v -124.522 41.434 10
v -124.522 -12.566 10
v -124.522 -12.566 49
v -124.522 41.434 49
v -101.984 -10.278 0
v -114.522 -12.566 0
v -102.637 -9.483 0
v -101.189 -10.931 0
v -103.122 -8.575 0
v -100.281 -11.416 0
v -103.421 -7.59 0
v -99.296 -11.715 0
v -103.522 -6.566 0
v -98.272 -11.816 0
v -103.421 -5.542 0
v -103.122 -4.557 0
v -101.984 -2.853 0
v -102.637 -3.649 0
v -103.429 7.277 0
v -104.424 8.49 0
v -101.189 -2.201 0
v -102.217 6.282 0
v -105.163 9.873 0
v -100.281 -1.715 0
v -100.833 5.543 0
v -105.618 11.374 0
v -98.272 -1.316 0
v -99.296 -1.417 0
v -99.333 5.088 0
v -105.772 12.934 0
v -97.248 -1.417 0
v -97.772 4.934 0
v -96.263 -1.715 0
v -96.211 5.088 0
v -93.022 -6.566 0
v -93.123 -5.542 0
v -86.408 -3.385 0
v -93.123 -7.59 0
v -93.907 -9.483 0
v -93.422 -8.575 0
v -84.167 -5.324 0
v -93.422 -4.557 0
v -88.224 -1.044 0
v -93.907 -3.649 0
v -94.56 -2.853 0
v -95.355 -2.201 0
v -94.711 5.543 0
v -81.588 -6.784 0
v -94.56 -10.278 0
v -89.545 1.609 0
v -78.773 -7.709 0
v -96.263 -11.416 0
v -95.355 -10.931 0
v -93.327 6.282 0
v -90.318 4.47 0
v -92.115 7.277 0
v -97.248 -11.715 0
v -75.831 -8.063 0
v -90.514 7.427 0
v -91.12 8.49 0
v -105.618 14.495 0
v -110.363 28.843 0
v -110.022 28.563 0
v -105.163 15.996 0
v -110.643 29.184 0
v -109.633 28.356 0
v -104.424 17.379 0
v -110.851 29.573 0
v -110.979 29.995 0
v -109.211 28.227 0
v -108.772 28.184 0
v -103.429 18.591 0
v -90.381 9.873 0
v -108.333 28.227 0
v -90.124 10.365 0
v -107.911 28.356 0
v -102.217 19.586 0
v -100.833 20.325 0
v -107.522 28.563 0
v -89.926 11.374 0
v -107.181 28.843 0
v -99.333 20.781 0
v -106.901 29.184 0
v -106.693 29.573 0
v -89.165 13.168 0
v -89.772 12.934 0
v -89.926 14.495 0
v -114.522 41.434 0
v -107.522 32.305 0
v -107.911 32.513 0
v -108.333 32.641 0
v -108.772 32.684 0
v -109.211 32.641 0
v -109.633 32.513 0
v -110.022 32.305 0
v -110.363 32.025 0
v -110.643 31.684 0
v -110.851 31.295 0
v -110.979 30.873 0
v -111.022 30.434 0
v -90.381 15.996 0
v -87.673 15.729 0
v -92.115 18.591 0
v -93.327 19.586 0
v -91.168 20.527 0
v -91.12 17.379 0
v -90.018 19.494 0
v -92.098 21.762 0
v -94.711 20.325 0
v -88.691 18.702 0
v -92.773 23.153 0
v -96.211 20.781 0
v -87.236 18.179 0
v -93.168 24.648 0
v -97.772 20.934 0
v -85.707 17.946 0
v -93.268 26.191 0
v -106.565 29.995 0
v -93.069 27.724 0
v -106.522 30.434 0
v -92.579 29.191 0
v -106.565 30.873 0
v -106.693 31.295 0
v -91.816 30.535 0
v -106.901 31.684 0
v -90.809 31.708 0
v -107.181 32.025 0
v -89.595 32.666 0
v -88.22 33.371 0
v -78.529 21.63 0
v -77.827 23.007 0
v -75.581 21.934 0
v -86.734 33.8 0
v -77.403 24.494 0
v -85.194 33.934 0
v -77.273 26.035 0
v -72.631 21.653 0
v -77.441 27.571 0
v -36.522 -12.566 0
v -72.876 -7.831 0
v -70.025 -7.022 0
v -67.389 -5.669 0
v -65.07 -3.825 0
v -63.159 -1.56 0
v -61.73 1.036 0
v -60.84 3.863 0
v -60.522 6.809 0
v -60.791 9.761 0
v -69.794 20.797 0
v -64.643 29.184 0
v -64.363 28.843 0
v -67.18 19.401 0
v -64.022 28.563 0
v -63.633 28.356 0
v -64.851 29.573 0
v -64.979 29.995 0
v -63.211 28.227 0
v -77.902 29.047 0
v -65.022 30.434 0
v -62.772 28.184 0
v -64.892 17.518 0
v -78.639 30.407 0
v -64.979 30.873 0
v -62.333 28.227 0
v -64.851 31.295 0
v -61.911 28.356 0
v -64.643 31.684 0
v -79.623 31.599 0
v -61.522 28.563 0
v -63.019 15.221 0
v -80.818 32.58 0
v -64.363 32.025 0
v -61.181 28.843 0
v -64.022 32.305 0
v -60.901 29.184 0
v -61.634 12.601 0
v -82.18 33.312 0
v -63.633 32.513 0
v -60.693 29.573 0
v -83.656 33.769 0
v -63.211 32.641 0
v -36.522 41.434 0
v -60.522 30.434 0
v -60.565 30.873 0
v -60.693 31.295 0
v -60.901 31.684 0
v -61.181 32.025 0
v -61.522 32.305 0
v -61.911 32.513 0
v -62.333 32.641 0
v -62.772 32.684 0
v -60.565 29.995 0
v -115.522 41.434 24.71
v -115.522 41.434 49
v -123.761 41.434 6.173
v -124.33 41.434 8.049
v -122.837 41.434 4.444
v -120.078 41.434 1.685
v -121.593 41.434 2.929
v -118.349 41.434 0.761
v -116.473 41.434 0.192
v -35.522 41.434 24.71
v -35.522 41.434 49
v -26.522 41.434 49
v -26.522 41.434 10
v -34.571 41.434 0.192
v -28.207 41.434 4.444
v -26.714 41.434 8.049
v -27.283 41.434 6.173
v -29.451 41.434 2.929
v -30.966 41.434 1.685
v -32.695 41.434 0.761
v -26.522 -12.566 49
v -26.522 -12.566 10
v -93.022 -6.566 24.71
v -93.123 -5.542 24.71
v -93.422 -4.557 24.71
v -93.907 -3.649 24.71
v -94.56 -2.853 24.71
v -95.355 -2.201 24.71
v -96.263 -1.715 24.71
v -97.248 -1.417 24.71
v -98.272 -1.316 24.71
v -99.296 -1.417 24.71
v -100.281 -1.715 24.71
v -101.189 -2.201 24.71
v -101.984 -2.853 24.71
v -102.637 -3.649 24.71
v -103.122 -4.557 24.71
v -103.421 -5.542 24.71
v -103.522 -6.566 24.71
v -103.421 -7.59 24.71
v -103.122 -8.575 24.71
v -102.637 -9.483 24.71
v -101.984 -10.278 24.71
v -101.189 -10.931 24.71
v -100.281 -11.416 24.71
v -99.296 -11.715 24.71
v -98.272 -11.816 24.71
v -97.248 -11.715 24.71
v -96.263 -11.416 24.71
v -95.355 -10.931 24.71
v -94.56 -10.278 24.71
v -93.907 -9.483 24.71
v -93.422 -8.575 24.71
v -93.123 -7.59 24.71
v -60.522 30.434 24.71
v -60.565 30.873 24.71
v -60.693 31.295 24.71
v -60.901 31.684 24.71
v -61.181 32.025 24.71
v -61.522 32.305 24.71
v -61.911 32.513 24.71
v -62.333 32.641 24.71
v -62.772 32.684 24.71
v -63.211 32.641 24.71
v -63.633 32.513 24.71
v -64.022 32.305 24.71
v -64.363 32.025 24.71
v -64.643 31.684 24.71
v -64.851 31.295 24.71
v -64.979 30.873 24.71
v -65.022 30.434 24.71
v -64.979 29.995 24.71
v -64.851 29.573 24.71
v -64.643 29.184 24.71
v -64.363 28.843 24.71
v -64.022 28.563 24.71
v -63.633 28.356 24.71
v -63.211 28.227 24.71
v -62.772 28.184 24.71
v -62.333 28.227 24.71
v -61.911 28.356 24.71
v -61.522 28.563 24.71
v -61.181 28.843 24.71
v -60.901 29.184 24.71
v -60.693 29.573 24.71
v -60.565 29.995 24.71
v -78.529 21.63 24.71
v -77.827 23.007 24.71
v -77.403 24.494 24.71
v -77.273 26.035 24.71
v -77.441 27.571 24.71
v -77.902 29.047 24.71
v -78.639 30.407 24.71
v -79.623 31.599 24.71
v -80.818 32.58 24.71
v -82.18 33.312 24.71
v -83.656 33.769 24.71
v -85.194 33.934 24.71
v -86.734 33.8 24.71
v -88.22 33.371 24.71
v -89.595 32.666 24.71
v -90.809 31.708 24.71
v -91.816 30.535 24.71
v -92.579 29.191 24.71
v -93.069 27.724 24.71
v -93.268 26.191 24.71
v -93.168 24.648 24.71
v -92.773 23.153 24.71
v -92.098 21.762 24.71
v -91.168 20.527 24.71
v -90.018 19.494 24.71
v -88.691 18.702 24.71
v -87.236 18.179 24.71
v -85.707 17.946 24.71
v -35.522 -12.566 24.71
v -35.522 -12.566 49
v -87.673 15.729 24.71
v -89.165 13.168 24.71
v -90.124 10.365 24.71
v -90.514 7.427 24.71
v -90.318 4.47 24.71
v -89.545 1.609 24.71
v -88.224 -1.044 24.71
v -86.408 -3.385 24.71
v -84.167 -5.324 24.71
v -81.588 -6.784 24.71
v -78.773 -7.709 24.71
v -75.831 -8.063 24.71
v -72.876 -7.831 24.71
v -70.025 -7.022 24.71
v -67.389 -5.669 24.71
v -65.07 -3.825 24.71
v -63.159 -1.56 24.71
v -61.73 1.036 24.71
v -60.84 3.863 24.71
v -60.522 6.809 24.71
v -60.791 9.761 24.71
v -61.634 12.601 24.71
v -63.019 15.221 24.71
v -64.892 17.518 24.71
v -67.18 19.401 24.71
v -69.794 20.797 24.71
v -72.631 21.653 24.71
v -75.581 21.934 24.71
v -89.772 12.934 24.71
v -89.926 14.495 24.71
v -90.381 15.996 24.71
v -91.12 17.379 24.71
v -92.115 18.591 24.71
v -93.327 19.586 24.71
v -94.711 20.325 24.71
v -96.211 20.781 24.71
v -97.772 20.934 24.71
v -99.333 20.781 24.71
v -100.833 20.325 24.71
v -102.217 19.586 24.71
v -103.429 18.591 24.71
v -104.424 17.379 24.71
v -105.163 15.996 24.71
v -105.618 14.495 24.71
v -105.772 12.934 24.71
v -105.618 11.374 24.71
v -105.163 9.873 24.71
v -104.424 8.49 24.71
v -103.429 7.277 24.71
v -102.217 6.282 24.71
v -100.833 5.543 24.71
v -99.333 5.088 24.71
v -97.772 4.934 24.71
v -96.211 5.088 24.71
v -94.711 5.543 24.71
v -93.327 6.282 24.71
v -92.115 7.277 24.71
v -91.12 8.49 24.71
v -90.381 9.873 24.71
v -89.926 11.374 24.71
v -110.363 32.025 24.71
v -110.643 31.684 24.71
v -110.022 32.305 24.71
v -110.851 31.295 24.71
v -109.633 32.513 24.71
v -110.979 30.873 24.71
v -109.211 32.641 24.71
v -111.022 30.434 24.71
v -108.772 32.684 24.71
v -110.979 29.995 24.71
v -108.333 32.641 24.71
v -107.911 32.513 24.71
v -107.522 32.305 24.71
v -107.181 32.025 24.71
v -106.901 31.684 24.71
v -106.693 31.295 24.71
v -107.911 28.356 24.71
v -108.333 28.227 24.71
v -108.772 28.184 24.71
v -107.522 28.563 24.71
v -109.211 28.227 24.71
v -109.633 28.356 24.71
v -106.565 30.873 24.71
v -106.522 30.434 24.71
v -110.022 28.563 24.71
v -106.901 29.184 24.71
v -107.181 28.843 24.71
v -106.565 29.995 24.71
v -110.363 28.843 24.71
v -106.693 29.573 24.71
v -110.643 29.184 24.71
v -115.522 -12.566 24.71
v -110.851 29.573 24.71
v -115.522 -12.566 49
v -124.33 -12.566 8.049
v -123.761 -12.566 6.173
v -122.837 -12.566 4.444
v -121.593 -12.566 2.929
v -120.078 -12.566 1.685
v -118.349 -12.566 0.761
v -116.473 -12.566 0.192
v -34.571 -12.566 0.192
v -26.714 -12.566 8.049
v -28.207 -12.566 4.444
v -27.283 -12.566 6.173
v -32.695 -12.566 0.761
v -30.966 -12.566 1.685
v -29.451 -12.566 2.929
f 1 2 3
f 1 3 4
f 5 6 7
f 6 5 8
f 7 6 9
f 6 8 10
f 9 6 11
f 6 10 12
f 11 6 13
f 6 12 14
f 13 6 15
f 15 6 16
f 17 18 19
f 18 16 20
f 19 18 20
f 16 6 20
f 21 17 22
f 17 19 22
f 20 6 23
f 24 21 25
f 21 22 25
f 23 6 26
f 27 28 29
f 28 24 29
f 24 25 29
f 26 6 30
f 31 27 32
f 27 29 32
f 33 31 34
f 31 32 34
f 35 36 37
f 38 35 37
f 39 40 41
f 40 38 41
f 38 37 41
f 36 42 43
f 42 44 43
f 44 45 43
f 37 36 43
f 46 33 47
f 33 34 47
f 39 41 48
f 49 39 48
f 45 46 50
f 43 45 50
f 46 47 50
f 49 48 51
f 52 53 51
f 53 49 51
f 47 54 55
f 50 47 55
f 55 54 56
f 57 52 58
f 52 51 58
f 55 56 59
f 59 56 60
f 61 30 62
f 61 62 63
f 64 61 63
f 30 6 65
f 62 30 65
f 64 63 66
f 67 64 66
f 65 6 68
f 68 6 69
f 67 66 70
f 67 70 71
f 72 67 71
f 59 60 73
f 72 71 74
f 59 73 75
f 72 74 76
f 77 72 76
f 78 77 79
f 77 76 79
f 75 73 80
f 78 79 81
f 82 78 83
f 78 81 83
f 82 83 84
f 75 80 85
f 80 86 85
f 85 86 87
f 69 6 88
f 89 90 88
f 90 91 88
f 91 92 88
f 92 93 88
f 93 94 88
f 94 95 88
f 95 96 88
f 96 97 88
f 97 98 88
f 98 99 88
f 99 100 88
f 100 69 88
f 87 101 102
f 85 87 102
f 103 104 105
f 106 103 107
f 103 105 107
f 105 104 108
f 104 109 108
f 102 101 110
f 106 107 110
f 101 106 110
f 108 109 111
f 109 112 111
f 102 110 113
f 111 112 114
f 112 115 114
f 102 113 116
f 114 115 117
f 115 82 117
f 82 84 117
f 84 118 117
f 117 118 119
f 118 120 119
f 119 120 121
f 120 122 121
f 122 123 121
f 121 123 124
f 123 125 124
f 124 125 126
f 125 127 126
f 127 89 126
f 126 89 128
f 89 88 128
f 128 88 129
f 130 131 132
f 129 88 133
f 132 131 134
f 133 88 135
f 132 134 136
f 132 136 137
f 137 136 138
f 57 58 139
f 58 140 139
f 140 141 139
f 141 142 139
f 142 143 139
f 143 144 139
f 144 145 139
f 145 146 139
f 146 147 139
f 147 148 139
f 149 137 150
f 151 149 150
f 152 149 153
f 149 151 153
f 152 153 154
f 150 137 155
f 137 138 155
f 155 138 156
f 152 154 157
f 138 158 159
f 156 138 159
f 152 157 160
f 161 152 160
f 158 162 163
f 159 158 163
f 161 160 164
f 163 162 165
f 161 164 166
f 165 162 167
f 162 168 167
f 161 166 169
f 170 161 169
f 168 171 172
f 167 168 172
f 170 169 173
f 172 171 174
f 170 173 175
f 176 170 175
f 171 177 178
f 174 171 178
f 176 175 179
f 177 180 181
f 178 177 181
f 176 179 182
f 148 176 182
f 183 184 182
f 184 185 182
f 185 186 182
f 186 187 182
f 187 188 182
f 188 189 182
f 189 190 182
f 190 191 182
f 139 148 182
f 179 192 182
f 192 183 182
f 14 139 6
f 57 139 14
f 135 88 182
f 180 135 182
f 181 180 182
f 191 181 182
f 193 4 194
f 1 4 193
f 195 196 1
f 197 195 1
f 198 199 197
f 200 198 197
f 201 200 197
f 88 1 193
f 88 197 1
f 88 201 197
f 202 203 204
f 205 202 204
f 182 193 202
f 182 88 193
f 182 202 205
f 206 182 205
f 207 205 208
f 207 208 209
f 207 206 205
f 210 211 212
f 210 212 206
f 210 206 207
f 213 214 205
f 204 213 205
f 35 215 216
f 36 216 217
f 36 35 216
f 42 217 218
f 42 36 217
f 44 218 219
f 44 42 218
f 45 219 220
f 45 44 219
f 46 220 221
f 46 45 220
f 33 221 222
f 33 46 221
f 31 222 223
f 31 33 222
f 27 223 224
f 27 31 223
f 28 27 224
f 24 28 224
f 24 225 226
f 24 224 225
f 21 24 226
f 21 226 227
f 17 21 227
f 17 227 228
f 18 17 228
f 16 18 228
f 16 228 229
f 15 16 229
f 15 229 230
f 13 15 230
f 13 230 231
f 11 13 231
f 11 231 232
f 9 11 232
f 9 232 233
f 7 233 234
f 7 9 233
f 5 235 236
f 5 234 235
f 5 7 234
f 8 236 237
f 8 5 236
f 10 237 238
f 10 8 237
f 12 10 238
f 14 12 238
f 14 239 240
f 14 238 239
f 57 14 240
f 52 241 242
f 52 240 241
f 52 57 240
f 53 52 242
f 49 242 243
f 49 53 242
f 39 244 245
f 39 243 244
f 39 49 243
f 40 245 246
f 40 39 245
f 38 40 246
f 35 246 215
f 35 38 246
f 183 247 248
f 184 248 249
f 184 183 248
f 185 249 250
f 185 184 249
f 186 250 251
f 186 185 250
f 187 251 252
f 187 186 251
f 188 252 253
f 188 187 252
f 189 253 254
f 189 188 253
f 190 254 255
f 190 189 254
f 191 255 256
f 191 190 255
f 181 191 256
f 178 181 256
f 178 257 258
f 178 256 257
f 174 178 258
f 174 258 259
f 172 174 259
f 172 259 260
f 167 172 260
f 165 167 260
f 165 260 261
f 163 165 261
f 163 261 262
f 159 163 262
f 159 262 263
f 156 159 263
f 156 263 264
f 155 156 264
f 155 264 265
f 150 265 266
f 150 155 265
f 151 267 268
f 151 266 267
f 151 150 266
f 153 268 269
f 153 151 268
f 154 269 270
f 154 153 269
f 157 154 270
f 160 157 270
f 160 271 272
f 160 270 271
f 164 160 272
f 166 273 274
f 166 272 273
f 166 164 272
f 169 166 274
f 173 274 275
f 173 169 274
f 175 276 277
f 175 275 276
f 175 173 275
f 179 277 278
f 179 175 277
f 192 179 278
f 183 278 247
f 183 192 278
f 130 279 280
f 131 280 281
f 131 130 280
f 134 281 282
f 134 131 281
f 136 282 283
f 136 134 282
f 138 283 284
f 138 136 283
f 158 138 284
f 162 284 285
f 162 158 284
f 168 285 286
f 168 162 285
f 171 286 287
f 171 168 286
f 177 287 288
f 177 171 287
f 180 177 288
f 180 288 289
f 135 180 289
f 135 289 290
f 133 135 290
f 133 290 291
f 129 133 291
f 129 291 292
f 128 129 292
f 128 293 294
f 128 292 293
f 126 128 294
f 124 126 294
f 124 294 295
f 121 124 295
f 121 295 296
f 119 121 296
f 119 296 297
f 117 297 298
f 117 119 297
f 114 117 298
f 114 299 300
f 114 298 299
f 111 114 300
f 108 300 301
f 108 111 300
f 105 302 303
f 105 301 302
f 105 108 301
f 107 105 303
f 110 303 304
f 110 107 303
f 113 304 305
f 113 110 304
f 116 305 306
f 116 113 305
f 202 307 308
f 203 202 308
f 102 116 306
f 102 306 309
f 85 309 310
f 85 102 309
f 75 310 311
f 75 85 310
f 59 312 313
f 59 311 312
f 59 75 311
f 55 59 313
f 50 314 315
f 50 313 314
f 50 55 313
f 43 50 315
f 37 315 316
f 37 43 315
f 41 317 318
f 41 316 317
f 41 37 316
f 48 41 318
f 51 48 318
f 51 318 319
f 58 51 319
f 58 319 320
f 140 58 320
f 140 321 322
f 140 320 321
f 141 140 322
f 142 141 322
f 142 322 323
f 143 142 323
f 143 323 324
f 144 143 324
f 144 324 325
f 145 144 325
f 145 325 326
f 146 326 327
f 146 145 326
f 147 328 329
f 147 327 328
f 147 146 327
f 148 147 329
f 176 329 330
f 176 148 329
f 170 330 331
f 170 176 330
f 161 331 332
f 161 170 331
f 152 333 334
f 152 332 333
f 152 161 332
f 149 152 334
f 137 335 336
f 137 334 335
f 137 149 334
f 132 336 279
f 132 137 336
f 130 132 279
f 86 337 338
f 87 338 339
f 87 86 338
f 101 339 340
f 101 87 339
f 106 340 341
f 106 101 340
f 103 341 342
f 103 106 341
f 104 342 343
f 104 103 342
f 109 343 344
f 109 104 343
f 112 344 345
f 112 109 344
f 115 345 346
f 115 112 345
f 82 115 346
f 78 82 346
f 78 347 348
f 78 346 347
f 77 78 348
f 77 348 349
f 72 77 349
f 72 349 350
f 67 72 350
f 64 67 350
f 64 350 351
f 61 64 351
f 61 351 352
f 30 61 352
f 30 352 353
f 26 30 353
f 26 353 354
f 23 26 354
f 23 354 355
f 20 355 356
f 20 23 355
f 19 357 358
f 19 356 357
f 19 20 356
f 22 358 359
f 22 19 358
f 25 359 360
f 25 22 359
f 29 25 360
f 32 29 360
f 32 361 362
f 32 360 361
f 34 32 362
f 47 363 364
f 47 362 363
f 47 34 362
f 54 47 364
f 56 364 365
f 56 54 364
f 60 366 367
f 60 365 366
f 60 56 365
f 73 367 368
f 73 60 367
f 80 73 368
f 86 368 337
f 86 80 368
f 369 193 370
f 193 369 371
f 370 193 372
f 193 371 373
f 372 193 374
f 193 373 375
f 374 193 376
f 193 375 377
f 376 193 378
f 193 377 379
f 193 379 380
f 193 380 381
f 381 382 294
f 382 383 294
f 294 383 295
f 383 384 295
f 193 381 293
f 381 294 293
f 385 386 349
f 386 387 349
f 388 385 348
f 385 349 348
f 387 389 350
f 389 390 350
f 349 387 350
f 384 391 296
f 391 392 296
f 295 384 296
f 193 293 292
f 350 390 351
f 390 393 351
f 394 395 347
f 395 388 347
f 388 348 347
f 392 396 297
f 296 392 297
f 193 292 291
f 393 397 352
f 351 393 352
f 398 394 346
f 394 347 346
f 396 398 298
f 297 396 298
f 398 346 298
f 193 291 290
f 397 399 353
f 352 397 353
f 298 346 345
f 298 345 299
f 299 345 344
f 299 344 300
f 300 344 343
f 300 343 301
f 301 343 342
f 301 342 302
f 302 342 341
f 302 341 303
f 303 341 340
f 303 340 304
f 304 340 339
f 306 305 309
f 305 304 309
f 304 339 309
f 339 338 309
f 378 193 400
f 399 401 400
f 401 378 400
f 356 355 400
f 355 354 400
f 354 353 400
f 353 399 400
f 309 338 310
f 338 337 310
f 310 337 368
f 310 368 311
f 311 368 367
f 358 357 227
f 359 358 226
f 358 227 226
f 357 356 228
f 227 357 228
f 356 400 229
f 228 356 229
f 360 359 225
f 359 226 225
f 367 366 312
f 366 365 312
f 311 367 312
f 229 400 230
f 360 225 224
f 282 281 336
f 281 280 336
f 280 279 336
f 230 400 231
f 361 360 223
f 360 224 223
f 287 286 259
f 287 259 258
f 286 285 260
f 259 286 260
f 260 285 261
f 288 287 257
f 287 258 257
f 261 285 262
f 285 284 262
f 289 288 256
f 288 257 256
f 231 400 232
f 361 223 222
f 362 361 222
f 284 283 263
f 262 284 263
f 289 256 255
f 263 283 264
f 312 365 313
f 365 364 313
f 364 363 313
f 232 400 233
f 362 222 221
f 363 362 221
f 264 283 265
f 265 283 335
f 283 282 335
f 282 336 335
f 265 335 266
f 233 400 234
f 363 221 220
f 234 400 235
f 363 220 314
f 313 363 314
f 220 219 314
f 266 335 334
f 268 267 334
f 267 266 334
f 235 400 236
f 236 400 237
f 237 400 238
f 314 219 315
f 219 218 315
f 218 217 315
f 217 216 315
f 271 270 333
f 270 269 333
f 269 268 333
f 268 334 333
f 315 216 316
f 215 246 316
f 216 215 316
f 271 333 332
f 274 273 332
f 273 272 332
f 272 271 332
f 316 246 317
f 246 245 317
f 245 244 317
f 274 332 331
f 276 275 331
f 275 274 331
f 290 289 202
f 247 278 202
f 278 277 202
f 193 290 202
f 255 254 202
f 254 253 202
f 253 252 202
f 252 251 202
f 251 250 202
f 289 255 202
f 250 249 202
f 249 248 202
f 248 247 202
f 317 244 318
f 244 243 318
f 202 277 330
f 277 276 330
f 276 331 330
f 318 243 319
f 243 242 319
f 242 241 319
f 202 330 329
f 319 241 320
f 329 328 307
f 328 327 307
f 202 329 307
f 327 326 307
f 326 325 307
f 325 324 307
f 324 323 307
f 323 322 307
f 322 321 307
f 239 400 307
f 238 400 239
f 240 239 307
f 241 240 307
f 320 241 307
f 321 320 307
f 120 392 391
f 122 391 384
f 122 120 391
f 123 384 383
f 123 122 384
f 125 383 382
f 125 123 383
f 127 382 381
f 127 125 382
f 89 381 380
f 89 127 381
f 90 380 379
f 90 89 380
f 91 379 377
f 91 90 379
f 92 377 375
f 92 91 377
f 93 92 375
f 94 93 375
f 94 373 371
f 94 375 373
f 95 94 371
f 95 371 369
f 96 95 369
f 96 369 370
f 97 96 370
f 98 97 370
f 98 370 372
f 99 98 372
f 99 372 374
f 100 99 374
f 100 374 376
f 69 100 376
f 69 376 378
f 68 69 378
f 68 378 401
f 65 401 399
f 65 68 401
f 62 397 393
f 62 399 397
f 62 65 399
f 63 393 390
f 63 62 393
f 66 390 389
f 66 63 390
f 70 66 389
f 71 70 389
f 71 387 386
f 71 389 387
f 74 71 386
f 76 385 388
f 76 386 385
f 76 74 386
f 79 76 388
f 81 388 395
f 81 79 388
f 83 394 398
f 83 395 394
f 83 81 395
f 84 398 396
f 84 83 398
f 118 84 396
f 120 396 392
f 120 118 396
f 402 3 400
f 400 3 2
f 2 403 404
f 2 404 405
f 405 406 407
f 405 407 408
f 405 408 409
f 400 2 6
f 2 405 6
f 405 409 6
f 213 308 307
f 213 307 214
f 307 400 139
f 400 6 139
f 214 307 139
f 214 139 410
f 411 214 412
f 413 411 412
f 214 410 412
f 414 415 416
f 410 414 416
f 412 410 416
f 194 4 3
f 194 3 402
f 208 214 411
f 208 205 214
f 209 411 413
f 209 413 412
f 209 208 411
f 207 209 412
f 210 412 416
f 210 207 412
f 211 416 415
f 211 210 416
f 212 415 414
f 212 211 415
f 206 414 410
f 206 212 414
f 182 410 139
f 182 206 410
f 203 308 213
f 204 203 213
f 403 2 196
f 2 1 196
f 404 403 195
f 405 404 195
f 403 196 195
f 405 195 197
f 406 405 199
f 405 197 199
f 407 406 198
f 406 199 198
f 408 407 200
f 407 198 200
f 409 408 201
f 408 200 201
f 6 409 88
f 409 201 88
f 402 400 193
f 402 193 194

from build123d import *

# Parameters (mm, degrees)
SKETCH1_W           = 98
SKETCH1_H           = 54
SKETCH1_R           = 8
SKETCH1_R_2         = 5.25
SKETCH1_R_3         = 2.25
BOSS_EXTRUDE1_DEPTH = 49
FILLET1_R           = 10
SKETCH2_R           = 1.810942065
CUT_EXTRUDE1_DEPTH  = 145.300803777
SKETCH3_W           = 80.000000001
SKETCH3_H           = 24.290118096
CUT_EXTRUDE2_DEPTH  = 145.300803849


with BuildPart() as part:
    # Sketch1 → Boss-Extrude1 (new body)
    with BuildSketch(Plane.XY):
        with Locations((-75.521973847, 14.434233909)):
            Rectangle(SKETCH1_W, SKETCH1_H)
        with Locations((-97.771973847, 12.934233909)):
            Circle(SKETCH1_R, mode=Mode.SUBTRACT)
        with Locations((-108.771973847, 30.434233909)):
            Circle(SKETCH1_R_2, mode=Mode.SUBTRACT)
        with Locations((-98.271973847, -6.565766091)):
            Circle(SKETCH1_R_2, mode=Mode.SUBTRACT)
        with Locations((-62.771973847, 30.434233909)):
            Circle(SKETCH1_R_2, mode=Mode.SUBTRACT)
        with BuildLine():
            ThreePointArc((-78.528692534, 21.62979932), (-88.924408217, 33.051798322), (-85.70721761, 17.946082504))
            ThreePointArc((-85.70721761, 17.946082504), (-68.673659404, -6.411199365), (-78.528692534, 21.62979932))
        make_face(mode=Mode.SUBTRACT)
        with Locations((-62.771973847, 30.434233909)):
            Circle(SKETCH1_R_2)
        with Locations((-62.771973847, 30.434233909)):
            Circle(SKETCH1_R_3, mode=Mode.SUBTRACT)
        with Locations((-108.771973847, 30.434233909)):
            Circle(SKETCH1_R_2)
        with Locations((-108.771973847, 30.434233909)):
            Circle(SKETCH1_R_3, mode=Mode.SUBTRACT)
    extrude(amount=BOSS_EXTRUDE1_DEPTH)

    # Fillet1
    fillet1_edges = [part.edges().sort_by_distance(p)[0] for p in [
        (-124.521973847, 14.434233909, 0),
        (-26.521973847, 14.434233909, 0),
    ]]
    fillet(fillet1_edges, radius=FILLET1_R)

    # Sketch2 → Cut-Extrude1 (cut, through all)
    with BuildSketch(Plane(origin=(0, 41.434233909, 0), x_dir=(1, 0, 0), z_dir=(0, 1, 0))):
        with Locations(Location((-50.601973847, -39, 0), (0, 0, 270))):
            Circle(SKETCH2_R)
        with Locations(Location((-100.441973847, -39, 0), (0, 0, 270))):
            Circle(SKETCH2_R)
    extrude(amount=-CUT_EXTRUDE1_DEPTH, mode=Mode.SUBTRACT)

    # Sketch3 → Cut-Extrude2 (cut, through all)
    with BuildSketch(Plane.XZ.offset(12.565766091)):
        with Locations((-75.521627845, 36.854940952)):
            Rectangle(SKETCH3_W, SKETCH3_H)
    extrude(amount=-CUT_EXTRUDE2_DEPTH, mode=Mode.SUBTRACT)


solid = part.part
